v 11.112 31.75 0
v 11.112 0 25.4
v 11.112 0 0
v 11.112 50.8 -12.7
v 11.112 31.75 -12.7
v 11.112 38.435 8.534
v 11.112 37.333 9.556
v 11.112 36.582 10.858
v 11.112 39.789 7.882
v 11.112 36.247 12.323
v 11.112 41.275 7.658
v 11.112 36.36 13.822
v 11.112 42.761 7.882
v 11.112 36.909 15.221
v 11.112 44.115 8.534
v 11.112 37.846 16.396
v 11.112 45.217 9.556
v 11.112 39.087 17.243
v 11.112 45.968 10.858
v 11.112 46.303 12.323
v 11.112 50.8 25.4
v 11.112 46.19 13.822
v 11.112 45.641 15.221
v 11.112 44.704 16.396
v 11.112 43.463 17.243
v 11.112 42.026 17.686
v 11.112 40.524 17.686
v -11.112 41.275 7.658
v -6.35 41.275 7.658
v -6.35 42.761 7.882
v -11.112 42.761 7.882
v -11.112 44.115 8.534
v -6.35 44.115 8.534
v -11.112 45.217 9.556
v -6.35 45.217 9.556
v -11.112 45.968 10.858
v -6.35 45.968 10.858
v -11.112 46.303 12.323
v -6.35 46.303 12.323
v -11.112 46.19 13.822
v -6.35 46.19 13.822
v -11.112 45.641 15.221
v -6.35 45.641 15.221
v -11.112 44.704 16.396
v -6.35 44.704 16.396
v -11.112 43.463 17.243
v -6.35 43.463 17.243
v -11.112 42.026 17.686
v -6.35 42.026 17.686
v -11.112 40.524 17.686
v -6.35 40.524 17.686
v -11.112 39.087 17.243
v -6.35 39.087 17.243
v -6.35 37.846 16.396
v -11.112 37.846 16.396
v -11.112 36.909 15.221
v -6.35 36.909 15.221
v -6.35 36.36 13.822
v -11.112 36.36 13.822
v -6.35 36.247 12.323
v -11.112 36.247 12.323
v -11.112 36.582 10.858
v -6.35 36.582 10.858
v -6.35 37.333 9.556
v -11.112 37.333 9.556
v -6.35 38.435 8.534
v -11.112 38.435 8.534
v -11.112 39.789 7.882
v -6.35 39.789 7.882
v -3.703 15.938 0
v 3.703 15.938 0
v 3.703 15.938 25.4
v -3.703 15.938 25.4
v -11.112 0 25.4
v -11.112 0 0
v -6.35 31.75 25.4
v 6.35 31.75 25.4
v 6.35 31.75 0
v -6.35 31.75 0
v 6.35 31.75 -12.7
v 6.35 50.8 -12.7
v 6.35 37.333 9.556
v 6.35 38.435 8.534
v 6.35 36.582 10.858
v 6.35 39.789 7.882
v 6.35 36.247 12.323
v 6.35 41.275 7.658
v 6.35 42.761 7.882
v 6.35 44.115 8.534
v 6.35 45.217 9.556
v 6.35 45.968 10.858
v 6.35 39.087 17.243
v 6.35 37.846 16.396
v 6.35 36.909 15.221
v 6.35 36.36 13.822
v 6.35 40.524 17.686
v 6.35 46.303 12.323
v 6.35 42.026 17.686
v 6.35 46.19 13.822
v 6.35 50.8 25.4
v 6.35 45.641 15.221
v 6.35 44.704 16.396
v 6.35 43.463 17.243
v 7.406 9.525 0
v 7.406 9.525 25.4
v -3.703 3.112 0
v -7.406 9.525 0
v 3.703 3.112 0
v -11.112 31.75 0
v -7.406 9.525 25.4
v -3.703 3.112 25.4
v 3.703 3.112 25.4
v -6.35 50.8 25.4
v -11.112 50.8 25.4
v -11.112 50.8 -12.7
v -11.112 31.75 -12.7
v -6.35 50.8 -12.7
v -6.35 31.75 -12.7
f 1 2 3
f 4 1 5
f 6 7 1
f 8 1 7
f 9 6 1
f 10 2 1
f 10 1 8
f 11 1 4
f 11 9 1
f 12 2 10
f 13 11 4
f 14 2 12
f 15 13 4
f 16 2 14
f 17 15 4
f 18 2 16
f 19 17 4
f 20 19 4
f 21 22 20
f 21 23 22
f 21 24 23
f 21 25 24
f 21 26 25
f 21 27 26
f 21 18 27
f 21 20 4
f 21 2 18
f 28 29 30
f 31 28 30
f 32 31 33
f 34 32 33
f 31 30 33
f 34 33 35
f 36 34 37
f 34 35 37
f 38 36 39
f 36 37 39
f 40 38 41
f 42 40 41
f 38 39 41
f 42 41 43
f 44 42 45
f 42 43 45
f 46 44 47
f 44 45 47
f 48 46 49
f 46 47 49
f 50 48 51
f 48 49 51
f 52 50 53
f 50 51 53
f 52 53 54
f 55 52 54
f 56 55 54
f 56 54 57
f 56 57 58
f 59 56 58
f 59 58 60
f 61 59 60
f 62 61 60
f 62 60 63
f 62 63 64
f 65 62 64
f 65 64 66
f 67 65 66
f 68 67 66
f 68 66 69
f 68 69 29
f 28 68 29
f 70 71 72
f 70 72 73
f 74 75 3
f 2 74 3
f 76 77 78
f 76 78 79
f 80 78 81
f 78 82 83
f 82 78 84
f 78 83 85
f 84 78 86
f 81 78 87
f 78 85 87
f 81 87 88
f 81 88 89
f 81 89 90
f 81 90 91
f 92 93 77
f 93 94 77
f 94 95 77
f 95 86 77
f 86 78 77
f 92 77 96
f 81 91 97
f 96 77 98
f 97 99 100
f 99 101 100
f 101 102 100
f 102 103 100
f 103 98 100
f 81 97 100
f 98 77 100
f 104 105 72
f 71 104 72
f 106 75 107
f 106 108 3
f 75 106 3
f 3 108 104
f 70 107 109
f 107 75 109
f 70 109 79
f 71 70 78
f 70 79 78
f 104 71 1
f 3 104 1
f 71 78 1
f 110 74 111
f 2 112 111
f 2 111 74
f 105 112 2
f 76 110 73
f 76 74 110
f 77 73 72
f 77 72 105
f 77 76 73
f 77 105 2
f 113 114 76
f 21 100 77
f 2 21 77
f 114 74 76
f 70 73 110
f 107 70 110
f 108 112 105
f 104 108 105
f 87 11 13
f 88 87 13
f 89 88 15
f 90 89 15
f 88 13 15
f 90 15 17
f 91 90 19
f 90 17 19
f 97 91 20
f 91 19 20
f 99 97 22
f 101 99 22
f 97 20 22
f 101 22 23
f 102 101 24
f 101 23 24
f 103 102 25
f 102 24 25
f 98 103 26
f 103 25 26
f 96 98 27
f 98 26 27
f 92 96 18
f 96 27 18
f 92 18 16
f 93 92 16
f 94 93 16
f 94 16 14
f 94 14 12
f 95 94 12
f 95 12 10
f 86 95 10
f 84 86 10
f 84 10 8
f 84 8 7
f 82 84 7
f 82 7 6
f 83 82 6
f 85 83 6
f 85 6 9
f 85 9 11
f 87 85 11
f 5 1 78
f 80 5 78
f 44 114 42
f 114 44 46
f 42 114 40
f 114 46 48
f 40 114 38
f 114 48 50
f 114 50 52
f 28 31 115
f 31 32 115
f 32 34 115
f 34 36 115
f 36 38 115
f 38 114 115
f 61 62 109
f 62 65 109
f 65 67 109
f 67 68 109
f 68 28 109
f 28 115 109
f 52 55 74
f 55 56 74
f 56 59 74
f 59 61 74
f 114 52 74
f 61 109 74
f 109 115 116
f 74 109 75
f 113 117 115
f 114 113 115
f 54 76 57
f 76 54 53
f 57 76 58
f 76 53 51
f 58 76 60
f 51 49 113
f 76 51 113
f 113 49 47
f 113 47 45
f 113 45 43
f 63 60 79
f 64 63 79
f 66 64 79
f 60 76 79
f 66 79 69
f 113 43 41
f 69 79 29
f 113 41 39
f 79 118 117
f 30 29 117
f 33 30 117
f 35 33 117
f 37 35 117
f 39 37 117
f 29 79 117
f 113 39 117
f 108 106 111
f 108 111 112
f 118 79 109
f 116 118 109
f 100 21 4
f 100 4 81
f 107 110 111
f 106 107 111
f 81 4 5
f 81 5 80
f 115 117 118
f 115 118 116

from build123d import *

# Parameters (mm, degrees)
BOSS_EXTRUDE1_DEPTH     = 25.4
CUT_EXTRUDE1_DEPTH      = 58.873030474
F_3_8_CLEARANCE_HOLE1_D = 10.0838
SKETCH7_W               = 4.7625
SKETCH7_H               = 19.05
BOSS_EXTRUDE2_DEPTH     = 12.7


with BuildPart() as part:
    # Sketch1 → Boss-Extrude1 (new body)
    with BuildSketch(Plane.XY):
        Polygon((-11.1125, 0), (11.1125, 0), (11.1125, 50.8), (6.35, 50.8), (6.35, 31.75), (-6.35, 31.75), (-6.35, 50.8), (-11.1125, 50.8), align=None)
    extrude(amount=BOSS_EXTRUDE1_DEPTH)

    # Sketch2 → Cut-Extrude1 (cut, through all)
    with BuildSketch(Plane.XY.offset(25.4)):
        Polygon((3.702835951, 15.9385), (-3.702835951, 15.9385), (-7.405671903, 9.525), (-3.702835951, 3.1115), (3.702835951, 3.1115), (7.405671903, 9.525), align=None)
    extrude(amount=-CUT_EXTRUDE1_DEPTH, mode=Mode.SUBTRACT)

    # 3/8 Clearance Hole1 (through all)
    with Locations(Plane.ZY.offset(11.1125)):
        with Locations((12.7, 41.275)):
            Hole(F_3_8_CLEARANCE_HOLE1_D / 2)

    # Sketch7 → Boss-Extrude2 (add)
    with BuildSketch(Plane(origin=(0, 0, 0), x_dir=(-1, 0, 0), z_dir=(0, 0, -1))):
        with Locations((-8.73125, 41.275)):
            Rectangle(SKETCH7_W, SKETCH7_H)
        with Locations((8.73125, 41.275)):
            Rectangle(SKETCH7_W, SKETCH7_H)
    extrude(amount=BOSS_EXTRUDE2_DEPTH)


solid = part.part
